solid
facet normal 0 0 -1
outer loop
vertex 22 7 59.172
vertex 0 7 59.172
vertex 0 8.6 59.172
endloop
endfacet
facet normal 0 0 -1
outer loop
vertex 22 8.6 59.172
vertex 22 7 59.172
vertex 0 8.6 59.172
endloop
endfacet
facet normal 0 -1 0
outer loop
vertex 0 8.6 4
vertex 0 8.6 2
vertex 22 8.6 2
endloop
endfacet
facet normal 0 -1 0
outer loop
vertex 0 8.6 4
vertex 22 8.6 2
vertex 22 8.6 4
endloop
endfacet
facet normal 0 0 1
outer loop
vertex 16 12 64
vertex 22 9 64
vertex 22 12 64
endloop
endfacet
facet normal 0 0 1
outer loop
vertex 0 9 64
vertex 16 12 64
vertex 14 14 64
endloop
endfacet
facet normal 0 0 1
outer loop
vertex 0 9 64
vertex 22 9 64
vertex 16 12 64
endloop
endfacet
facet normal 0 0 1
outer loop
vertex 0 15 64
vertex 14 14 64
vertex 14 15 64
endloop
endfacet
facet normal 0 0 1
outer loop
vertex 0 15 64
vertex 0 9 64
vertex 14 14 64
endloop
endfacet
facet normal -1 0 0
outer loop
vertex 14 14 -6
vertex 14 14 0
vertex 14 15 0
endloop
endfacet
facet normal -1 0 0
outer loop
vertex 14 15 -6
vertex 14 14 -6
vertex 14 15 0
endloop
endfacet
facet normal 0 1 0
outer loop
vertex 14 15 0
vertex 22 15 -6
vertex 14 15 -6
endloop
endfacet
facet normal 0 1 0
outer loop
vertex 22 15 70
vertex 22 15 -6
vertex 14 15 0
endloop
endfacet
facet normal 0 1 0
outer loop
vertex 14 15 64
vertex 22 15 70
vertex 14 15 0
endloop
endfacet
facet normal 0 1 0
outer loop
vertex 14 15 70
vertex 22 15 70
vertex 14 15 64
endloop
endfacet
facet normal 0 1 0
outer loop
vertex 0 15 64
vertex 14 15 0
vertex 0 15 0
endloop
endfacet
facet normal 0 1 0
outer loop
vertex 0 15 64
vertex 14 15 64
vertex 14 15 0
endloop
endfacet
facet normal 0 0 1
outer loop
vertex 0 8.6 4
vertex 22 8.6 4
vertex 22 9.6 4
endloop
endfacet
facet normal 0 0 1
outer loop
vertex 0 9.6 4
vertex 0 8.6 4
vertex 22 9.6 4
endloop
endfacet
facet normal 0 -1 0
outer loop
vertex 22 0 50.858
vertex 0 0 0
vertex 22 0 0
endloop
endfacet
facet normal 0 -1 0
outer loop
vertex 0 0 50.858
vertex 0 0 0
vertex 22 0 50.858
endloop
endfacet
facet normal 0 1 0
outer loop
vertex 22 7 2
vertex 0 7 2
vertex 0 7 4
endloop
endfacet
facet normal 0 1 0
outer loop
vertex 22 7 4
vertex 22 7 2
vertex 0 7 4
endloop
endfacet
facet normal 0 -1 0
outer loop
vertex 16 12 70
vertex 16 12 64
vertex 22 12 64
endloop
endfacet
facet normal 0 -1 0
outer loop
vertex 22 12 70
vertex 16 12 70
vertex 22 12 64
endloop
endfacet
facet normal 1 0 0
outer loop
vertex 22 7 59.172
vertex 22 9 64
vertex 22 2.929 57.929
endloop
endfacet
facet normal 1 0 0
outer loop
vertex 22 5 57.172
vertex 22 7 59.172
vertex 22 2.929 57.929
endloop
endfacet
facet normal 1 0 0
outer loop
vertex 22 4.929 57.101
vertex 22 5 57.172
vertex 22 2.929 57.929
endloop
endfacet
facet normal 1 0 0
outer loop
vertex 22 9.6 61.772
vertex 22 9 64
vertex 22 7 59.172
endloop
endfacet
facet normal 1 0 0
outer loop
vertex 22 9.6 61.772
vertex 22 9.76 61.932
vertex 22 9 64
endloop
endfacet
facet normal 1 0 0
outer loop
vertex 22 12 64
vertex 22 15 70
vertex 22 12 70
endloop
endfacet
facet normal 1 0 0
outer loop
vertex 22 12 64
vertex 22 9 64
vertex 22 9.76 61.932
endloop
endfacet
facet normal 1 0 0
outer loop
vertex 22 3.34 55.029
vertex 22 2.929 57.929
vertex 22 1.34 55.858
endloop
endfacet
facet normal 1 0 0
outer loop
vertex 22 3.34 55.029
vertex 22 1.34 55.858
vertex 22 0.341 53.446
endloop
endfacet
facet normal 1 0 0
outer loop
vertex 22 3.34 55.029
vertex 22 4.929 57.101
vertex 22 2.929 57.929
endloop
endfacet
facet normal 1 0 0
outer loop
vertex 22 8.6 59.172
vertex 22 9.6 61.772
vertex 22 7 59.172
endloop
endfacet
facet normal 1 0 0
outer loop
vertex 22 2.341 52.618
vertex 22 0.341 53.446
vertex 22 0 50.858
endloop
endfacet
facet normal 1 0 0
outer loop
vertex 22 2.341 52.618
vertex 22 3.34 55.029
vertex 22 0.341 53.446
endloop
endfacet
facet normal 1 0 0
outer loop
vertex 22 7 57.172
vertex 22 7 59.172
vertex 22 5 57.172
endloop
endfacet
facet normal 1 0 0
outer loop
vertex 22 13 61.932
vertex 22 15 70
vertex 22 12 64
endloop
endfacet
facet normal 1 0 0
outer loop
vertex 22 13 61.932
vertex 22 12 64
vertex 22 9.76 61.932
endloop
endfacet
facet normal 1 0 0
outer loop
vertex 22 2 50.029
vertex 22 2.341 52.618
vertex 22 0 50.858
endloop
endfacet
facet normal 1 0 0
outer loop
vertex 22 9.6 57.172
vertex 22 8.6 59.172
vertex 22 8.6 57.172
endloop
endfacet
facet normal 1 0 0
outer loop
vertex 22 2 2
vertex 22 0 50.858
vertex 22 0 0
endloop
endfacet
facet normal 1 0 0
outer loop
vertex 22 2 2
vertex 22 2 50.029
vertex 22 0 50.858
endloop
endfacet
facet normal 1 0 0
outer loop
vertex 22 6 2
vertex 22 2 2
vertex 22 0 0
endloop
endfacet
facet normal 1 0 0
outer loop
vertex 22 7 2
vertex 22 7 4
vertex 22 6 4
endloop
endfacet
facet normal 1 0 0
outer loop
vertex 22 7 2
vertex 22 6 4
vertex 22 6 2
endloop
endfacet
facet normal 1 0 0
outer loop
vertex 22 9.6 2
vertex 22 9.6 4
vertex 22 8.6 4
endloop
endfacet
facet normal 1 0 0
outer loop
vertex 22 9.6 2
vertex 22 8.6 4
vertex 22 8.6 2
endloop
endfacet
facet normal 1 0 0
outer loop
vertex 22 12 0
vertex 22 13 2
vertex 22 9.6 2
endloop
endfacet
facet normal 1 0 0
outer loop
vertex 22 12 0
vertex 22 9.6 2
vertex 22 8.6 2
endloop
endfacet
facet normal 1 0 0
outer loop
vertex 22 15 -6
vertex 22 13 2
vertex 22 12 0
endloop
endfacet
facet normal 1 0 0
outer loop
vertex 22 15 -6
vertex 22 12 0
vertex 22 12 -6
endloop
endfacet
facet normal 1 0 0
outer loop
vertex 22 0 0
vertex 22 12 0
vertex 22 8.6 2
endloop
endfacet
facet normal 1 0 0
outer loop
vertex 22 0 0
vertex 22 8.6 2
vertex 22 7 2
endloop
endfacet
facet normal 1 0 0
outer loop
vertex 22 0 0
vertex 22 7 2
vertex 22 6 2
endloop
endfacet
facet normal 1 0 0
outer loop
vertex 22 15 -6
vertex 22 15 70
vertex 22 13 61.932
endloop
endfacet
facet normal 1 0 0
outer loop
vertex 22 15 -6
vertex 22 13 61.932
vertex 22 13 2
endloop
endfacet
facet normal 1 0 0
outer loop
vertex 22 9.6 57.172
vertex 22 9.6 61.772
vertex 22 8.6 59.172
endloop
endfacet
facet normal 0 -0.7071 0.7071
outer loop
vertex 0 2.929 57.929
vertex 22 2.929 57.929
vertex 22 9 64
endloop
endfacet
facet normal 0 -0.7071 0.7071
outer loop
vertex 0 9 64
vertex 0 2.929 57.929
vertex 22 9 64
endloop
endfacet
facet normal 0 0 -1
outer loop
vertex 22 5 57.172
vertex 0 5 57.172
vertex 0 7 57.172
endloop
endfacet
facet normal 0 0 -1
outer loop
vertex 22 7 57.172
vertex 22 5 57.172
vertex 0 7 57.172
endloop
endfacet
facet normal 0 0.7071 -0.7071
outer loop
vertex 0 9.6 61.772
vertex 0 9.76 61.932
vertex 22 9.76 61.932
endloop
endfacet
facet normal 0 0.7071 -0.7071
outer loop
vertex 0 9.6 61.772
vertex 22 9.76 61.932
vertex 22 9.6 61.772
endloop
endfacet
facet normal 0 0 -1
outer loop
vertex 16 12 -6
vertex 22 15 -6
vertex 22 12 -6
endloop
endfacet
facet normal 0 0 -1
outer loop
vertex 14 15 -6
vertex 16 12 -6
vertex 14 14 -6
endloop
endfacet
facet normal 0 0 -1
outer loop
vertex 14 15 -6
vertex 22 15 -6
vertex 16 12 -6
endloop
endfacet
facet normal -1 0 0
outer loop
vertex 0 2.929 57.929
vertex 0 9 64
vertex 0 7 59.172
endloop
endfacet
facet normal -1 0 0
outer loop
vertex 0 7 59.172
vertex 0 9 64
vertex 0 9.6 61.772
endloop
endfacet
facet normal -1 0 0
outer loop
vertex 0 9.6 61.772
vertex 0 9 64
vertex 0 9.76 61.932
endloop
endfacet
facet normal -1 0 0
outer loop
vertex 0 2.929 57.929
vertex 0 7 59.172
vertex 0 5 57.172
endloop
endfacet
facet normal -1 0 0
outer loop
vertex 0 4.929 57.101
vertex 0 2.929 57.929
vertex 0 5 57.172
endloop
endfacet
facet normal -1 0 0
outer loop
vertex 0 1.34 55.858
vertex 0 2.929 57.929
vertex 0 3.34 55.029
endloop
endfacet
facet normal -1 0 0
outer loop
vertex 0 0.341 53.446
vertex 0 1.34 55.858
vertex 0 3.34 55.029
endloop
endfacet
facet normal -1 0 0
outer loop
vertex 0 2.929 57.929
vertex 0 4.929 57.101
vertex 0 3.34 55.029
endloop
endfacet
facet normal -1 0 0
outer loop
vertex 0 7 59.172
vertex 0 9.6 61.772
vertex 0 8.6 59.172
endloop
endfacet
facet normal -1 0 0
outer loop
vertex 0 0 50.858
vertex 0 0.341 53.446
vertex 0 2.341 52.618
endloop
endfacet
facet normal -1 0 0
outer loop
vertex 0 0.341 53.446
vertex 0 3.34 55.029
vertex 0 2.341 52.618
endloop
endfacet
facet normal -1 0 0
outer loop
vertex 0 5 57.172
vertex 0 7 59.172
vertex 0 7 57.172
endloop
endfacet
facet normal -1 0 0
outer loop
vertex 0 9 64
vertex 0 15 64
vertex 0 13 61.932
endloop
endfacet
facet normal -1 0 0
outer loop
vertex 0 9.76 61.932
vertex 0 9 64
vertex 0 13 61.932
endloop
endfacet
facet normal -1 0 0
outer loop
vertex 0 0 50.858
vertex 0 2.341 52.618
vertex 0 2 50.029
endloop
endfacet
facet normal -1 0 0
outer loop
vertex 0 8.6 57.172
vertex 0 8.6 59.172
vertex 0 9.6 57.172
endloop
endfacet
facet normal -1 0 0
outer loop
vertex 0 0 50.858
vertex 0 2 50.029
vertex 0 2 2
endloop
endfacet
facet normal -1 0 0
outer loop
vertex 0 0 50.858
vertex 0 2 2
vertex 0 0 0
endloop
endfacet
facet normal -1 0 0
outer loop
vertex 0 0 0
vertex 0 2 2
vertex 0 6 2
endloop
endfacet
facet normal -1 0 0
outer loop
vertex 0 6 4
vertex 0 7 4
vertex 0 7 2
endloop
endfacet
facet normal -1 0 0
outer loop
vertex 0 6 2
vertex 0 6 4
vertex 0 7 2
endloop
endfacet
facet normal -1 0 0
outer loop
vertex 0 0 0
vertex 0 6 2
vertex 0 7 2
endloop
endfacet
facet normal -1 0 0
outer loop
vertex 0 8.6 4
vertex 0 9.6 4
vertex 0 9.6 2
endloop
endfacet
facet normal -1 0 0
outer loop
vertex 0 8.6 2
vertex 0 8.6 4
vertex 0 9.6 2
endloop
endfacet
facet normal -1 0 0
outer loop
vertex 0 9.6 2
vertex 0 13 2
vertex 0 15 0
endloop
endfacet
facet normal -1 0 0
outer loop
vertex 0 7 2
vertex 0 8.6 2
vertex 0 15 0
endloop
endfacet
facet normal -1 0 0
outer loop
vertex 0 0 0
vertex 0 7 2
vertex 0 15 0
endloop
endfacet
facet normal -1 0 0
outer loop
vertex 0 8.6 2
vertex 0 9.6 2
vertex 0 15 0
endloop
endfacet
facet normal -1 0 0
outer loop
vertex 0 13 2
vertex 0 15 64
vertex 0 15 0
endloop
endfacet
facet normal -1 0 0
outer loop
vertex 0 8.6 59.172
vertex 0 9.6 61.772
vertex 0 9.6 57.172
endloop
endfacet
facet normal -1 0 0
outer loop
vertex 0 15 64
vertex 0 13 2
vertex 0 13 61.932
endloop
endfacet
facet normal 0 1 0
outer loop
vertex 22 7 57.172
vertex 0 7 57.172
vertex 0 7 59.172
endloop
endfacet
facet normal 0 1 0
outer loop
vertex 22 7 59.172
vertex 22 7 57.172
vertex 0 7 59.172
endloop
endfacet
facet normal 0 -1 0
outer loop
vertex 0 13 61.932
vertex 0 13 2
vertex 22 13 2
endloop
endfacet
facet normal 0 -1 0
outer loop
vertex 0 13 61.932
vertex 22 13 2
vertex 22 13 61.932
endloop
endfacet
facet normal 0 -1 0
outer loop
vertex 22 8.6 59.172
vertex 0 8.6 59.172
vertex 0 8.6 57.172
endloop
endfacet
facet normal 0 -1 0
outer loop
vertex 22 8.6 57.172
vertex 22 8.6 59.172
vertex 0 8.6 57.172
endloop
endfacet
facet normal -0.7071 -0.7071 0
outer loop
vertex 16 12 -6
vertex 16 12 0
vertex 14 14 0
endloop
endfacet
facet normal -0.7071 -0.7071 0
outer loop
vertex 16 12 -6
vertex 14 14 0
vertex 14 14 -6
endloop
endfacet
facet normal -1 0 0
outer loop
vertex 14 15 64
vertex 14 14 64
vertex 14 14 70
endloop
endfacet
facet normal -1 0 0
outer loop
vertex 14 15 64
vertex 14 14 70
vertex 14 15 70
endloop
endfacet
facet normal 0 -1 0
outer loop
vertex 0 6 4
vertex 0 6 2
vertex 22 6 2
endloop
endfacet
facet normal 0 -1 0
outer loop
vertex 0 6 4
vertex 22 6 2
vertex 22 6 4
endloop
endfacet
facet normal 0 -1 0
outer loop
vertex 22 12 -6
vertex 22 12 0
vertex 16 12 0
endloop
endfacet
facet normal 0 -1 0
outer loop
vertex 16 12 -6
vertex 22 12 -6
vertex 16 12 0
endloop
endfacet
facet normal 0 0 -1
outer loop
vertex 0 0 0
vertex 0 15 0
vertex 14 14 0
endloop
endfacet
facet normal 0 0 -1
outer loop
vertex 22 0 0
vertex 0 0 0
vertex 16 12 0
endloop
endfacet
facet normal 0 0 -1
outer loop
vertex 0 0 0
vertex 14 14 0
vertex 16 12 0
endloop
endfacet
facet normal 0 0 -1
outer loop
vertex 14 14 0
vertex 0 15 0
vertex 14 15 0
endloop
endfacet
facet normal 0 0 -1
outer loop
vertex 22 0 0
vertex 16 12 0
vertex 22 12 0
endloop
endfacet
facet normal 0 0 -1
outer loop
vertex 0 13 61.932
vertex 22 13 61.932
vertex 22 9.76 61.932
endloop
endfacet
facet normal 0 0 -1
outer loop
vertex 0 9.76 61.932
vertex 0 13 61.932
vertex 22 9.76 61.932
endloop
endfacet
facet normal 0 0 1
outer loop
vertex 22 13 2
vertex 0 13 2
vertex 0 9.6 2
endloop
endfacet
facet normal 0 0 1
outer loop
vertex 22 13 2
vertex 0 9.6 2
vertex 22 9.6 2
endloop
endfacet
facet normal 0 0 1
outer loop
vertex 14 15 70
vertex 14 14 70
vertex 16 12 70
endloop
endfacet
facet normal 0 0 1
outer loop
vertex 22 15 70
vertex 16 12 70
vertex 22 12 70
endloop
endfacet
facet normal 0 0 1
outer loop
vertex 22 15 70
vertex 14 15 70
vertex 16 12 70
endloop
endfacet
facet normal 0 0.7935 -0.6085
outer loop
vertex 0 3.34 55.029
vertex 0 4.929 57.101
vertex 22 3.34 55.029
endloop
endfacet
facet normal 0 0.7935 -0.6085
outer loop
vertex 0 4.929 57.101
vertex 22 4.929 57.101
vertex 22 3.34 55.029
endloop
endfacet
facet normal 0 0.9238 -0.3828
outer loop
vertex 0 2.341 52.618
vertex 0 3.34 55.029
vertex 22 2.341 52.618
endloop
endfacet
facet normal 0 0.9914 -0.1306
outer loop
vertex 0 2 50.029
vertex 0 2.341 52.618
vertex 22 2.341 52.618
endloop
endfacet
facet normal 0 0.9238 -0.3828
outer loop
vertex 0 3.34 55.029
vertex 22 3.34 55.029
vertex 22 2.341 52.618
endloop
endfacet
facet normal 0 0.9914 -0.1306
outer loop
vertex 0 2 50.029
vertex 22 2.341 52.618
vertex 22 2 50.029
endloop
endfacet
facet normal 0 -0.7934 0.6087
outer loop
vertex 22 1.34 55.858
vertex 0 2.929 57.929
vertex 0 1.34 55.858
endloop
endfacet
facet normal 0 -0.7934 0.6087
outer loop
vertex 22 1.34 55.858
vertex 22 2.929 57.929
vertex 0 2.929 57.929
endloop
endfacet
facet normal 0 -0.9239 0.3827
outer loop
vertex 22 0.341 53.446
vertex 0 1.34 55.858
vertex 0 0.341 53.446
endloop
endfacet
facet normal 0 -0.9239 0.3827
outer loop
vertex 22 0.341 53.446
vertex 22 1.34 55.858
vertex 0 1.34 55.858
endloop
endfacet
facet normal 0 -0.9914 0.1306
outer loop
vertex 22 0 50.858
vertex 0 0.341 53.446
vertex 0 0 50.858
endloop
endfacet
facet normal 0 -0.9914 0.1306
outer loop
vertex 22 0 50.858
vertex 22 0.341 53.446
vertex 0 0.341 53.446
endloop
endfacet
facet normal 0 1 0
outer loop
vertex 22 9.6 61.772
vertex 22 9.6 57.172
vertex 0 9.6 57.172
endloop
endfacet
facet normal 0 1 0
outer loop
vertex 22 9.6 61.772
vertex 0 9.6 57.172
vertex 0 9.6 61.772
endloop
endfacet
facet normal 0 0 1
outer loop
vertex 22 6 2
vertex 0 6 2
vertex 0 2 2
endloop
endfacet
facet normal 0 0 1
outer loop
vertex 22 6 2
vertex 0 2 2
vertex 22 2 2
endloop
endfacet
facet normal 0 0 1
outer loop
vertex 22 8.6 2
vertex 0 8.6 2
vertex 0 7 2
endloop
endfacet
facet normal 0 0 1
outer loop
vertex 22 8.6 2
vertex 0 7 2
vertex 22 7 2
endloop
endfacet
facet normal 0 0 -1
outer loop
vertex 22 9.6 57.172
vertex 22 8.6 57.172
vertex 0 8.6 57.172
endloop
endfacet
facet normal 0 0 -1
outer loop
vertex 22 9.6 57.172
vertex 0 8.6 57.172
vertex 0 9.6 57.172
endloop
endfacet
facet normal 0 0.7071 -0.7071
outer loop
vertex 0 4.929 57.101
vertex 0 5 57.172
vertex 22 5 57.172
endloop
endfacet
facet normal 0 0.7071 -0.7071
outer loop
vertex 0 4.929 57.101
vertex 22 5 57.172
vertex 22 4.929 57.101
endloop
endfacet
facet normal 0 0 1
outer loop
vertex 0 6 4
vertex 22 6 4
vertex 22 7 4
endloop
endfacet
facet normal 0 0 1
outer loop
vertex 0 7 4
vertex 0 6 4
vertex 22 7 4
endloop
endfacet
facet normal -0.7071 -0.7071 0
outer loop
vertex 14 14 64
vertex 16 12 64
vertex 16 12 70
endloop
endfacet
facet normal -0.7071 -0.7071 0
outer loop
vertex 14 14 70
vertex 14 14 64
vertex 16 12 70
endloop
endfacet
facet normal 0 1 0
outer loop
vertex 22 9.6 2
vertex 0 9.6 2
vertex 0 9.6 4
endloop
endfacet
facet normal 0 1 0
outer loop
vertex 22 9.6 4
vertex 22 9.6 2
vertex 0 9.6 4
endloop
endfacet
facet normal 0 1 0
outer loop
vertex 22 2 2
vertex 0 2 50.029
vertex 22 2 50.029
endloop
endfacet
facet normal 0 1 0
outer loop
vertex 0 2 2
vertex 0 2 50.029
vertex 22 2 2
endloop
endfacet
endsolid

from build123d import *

# Parameters (mm, degrees)
SKETCH_1_W      = 22
SKETCH_1_H      = 15
EXTRUDE_1_DEPTH = 2
SKETCH_2_W      = 22
SKETCH_2_H      = 30
EXTRUDE_2_DEPTH = 2
EXTRUDE_3_DEPTH = 22
SKETCH_4_W      = 8
SKETCH_4_H      = 3
EXTRUDE_4_DEPTH = 6
SKETCH_5_W      = 8
SKETCH_5_H      = 3
EXTRUDE_5_DEPTH = 6
CHAMFER_1_SIZE  = 2
SKETCH_6_W      = 2
SKETCH_6_H      = 1
EXTRUDE_6_DEPTH = 22
FILLET_1_R      = 10


with BuildPart() as part:
    # 草图1 → 凸台-拉伸1 (new body)
    with BuildSketch(Plane.XY):
        with Locations((11, 7.5)):
            Rectangle(SKETCH_1_W, SKETCH_1_H)
    extrude(amount=EXTRUDE_1_DEPTH)

    # 草图2 → 凸台-拉伸2 (add)
    with BuildSketch(Plane.XZ):
        with Locations((11, 15)):
            Rectangle(SKETCH_2_W, SKETCH_2_H)
    extrude(amount=-EXTRUDE_2_DEPTH)

    # 草图3 → 凸台-拉伸3 (add)
    with BuildSketch(Plane.ZY):
        Polygon((64, 15), (0, 15), (0, 13), (61.931971091, 13), (61.931971091, 10.452580583), (61.931971091, 9.760398216), (60.906850806, 8.735277931), (55.196693161, 3.025120286), (54.171572875, 2), (53.479390508, 2), (30, 2), (30, 0), (55, 0), (64, 9), align=None)
    extrude(amount=-EXTRUDE_3_DEPTH)

    # 草图4 → 凸台-拉伸4 (add)
    with BuildSketch(Plane.XY.offset(64)):
        with Locations((18, 13.5)):
            Rectangle(SKETCH_4_W, SKETCH_4_H)
    extrude(amount=EXTRUDE_4_DEPTH)

    # 草图5 → 凸台-拉伸5 (add)
    with BuildSketch(Plane(origin=(0, 0, 0), x_dir=(-1, 0, 0), z_dir=(0, 0, -1))):
        with Locations((-18, 13.5)):
            Rectangle(SKETCH_5_W, SKETCH_5_H)
    extrude(amount=EXTRUDE_5_DEPTH)

    # 倒角1
    chamfer_1_edges = [part.edges().sort_by_distance(p)[0] for p in [
        (14, 12, 67),
        (14, 12, -3),
    ]]
    chamfer(chamfer_1_edges, length=CHAMFER_1_SIZE)

    # 草图6 → 凸台-拉伸6 (add)
    with BuildSketch(Plane.ZY):
        Polygon((57.171572875, 7), (59.171572875, 7), (59.171572875, 8.6), (57.171572875, 8.6), (57.171572875, 9.6), (61.771572875, 9.6), (61.771572875, 7.925359102), (60.513582407, 7.925359102), (60.513582407, 6.316484683), (59.171572875, 6.316484683), (59.171572875, 5), (57.171572875, 5), align=None)
        with Locations((3, 6.5)):
            Rectangle(SKETCH_6_W, SKETCH_6_H)
        with Locations((3, 9.1)):
            Rectangle(SKETCH_6_W, SKETCH_6_H)
    extrude(amount=-EXTRUDE_6_DEPTH)

    # 圆角1
    fillet_1_edges = [part.edges().sort_by_distance(p)[0] for p in [
        (11, 2, 54.171572875),
        (11, 0, 55),
    ]]
    fillet(fillet_1_edges, radius=FILLET_1_R)


solid = part.part
